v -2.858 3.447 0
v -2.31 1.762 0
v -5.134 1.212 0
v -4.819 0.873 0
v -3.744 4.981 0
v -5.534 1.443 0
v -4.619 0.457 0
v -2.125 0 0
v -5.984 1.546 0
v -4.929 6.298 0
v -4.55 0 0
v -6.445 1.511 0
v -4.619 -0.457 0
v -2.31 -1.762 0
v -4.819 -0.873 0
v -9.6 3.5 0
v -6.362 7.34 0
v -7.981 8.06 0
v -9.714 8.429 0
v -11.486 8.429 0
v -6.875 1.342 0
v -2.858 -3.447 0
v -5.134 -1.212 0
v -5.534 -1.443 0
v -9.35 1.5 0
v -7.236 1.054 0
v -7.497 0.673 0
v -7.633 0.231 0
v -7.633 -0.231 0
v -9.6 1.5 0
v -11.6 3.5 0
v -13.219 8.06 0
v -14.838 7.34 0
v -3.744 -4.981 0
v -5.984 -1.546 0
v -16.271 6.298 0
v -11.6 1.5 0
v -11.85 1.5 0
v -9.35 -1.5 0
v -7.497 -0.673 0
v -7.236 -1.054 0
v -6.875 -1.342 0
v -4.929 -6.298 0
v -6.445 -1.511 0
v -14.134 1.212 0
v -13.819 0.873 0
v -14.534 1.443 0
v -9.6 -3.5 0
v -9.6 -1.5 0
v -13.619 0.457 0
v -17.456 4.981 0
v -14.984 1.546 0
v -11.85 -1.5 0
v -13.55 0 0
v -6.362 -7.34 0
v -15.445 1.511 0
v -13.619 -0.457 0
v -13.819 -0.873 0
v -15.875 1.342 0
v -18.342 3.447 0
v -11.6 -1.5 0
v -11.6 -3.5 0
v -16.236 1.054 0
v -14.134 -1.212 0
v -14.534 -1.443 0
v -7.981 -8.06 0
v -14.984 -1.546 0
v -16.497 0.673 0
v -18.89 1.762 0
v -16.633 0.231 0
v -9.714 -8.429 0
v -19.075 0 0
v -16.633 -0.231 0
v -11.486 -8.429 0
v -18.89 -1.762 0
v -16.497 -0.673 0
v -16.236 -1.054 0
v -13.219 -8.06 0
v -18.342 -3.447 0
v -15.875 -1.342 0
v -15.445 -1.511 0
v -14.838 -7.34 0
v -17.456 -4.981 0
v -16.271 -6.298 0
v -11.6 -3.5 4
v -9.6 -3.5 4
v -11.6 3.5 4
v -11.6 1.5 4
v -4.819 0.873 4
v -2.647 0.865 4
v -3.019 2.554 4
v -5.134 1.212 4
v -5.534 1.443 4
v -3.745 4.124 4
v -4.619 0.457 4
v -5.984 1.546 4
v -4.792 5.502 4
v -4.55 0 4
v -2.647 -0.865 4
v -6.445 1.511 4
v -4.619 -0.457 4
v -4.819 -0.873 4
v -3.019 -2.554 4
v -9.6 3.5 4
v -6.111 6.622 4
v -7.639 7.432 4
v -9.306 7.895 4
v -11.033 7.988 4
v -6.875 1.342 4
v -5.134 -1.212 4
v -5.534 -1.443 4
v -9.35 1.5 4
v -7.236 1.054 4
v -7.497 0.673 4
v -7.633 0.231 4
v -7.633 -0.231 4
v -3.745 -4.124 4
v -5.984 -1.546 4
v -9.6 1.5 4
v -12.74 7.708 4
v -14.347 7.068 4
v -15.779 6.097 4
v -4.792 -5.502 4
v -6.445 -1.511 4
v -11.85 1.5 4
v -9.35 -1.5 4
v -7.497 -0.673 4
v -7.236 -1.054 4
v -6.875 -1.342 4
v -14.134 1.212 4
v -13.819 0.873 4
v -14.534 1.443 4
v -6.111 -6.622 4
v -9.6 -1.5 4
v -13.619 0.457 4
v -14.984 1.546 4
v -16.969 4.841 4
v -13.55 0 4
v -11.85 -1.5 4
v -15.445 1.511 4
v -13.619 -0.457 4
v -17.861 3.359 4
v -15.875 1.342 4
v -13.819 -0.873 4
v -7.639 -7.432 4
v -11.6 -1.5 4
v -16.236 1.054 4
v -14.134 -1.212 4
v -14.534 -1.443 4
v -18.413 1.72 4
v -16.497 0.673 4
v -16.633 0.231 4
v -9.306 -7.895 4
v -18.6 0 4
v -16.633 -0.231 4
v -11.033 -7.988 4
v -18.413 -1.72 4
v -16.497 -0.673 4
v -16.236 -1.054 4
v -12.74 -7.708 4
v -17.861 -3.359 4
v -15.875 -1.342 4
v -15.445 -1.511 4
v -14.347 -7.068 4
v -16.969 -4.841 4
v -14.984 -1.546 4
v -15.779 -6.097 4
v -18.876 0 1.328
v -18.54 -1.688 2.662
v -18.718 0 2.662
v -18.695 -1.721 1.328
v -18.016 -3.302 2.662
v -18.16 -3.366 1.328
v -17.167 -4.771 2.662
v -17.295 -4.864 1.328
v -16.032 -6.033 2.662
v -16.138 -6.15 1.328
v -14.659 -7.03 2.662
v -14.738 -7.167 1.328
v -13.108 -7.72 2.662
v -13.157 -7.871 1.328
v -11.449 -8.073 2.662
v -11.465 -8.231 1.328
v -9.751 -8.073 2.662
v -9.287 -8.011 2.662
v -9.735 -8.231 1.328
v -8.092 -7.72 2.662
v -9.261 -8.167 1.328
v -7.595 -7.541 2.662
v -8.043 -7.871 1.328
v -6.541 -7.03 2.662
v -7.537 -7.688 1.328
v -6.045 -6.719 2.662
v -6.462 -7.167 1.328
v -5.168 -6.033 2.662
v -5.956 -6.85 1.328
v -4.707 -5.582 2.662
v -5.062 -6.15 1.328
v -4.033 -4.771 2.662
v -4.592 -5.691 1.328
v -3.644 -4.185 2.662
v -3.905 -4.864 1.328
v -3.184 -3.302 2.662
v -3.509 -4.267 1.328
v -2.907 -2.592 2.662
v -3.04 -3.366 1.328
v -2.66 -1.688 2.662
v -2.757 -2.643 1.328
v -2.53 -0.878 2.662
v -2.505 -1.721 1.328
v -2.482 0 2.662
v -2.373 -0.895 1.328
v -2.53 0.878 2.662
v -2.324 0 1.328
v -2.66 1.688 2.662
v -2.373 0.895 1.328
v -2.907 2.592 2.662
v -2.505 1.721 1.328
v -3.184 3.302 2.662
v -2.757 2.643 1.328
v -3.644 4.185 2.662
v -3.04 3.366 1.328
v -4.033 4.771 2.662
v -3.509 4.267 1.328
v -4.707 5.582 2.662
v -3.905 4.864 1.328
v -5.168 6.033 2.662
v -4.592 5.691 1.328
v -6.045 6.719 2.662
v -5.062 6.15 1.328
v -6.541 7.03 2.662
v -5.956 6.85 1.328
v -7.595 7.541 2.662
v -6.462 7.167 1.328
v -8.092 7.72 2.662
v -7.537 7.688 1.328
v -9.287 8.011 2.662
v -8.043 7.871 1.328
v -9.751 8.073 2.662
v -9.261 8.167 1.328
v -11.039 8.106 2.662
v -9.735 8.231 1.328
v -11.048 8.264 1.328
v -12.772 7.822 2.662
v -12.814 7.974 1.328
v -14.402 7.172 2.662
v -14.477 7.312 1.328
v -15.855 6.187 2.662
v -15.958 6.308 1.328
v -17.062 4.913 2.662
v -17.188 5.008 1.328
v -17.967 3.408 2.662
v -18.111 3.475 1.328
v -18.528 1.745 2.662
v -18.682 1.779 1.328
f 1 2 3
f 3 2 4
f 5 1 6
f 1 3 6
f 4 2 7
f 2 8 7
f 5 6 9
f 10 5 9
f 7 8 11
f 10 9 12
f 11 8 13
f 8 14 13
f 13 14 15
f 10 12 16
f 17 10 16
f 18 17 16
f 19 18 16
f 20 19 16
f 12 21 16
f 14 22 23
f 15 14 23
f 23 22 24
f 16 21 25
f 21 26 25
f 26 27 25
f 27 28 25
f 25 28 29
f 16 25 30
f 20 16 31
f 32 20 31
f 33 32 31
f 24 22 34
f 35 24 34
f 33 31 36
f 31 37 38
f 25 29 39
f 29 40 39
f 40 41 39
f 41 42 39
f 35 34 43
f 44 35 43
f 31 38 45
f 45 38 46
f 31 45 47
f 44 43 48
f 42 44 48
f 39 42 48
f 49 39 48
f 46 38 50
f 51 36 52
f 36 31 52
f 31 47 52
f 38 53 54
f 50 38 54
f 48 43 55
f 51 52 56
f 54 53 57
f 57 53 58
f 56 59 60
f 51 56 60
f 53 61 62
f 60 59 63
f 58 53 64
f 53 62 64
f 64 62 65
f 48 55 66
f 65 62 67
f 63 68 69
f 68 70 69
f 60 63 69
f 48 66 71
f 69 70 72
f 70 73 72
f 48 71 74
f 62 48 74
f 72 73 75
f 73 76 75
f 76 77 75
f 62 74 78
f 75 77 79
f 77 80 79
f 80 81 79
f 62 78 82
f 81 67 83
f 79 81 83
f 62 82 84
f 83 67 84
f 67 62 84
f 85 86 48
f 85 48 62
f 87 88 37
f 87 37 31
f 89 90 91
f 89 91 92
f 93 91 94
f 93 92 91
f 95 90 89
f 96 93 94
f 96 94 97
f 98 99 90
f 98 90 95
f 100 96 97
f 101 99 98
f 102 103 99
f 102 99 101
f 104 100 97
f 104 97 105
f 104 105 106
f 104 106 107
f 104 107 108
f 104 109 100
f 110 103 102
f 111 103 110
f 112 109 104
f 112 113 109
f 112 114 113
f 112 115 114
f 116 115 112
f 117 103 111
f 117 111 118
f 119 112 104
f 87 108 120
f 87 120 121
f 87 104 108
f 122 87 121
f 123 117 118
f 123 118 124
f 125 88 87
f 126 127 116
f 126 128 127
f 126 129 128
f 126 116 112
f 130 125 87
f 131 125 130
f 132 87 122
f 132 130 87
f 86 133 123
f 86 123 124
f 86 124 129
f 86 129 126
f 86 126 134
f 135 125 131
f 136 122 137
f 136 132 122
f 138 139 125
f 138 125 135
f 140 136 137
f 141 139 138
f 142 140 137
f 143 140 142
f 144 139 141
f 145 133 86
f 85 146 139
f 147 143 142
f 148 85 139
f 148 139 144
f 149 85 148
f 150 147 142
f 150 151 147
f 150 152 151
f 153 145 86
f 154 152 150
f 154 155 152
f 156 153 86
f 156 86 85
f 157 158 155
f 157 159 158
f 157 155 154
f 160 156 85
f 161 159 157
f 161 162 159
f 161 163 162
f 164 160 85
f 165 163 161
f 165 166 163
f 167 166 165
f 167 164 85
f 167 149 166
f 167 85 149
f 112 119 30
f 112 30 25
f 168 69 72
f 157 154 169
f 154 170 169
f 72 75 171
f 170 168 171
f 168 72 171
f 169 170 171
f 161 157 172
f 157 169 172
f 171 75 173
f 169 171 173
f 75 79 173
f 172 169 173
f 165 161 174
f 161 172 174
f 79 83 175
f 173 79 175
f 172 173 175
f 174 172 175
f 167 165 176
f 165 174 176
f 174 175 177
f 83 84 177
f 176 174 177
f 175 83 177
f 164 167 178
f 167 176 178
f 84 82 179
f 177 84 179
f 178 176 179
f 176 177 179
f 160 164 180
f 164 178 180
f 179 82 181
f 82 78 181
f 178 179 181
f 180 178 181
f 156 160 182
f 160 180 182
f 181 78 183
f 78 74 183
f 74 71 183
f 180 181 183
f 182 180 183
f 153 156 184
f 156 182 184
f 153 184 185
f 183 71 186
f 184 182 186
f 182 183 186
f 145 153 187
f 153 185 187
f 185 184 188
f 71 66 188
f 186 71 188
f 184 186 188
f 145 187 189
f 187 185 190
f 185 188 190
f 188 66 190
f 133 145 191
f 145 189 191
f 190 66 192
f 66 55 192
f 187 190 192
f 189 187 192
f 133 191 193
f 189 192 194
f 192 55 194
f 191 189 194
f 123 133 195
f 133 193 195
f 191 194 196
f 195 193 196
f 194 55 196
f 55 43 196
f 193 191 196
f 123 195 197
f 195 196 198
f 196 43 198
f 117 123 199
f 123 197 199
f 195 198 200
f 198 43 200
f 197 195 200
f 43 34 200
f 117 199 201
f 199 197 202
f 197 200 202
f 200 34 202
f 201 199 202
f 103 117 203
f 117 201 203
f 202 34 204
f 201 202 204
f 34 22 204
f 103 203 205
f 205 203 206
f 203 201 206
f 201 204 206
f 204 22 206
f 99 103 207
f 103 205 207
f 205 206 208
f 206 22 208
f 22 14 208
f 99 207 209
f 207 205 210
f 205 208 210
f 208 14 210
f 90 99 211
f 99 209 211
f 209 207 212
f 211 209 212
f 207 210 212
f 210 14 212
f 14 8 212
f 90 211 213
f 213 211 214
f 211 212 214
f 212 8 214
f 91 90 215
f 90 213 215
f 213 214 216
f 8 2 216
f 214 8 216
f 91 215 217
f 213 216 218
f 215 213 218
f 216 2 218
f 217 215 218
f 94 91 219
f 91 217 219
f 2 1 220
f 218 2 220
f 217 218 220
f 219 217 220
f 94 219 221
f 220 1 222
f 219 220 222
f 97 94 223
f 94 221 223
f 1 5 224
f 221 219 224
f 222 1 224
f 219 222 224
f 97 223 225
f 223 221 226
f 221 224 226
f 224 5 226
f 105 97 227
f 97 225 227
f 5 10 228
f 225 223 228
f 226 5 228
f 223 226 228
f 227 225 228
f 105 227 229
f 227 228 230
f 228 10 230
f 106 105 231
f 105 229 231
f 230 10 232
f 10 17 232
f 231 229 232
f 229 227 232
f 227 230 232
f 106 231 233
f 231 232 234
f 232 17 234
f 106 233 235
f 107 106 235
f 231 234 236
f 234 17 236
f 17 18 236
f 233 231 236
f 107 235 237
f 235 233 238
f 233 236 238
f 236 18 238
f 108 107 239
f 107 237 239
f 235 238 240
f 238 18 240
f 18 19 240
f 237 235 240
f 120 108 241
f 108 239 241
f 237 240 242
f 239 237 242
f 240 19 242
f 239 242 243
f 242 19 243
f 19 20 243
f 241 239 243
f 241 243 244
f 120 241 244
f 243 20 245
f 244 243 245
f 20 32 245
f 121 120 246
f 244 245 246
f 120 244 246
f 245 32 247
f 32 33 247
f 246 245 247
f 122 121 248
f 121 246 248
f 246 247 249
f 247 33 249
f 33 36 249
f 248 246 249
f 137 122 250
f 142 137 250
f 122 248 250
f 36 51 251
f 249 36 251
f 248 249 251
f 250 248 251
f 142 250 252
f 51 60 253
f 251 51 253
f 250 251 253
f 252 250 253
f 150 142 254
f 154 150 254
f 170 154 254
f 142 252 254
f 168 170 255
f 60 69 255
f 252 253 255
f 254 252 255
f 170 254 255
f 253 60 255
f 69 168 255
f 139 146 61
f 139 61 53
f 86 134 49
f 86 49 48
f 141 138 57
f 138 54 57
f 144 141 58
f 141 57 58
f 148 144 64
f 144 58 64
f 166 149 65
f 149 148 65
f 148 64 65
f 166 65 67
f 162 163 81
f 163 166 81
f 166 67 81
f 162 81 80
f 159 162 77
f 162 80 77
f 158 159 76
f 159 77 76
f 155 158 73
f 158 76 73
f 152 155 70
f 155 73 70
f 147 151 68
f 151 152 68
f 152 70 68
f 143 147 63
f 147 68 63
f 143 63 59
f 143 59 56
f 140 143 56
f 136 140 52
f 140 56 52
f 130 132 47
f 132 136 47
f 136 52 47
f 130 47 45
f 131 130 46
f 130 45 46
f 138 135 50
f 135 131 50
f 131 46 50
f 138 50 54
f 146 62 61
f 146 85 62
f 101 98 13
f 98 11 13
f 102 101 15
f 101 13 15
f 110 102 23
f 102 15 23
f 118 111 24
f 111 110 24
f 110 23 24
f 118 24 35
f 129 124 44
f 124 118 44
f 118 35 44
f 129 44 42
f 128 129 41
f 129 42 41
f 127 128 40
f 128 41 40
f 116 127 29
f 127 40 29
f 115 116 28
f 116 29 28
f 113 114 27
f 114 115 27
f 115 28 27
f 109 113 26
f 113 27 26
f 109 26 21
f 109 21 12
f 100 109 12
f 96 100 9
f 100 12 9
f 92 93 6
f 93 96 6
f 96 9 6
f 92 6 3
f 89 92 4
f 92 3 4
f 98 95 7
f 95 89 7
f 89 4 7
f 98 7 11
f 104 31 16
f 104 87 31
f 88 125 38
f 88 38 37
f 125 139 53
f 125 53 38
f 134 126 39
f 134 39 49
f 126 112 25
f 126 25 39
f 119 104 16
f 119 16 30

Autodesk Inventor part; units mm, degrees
ref_plane "YZ Plane" through (0, 0, 0) normal (1, 0, 0) x (0, 1, 0)
ref_plane "XZ Plane" through (0, 0, 0) normal (0, 1, 0) x (-1, 0, 0)
ref_plane "XY Plane" through (0, 0, 0) normal (0, 0, 1) x (1, 0, 0)
sketch "Sketch1" plane through (0, 0, 0) normal (0, 0, 1) x (1, 0, 0)
  circle A0 centre (-10.6, 0) radius 8.475
  circle A1 centre (-15.1, 0) radius 2.2 projected
  circle A2 centre (-6.1, 0) radius 2.2 projected
  circle A3 centre (-10.6, 0) radius 8.475
  circle A4 centre (-15.1, 0) radius 2.2
  circle A5 centre (-6.1, 0) radius 2.2
  circle A6 centre (-15.1, 0) radius 1.55
  circle A7 centre (-6.1, 0) radius 1.55
  point P0 (0, 0)
  dimension "d9" = 3.1
  dimension "d10" = 3.1
sketch "Sketch2" plane through (0, 0, 0) normal (0, 1, 0) x (-1, 0, 0)
  line L0 (19.075, 0) -> (2.125, 0) projected
  line L1 (7.55, 0) -> (13.65, 0)
  arc A0 (18.6, 4) -> (19.075, 0) centre (62.4336, 7.177) ccw
  line L2 (13.65, 0) -> (19.075, 0)
  line L3 (10.6, 0) -> (10.6, 4)
  line L4 (10.6, 0) -> (10.6, 4)
  line L5 (10.6, 4) -> (18.6, 4)
  point P0 (0, 0)
  dimension "d15" = 4
  dimension "d16" = 8
revolve "Revolution1" add sketch "Sketch2" angle 360 about axis through (-10.6, 0, 0) along (0, 0, 1)
extrude "Extrusion3" cut sketch "Sketch1" along normal blind 4 contours A6 | A7
sketch "Sketch5" plane through (-10.6, 0, 4) normal (0, 0, 1) x (1, 0, 0)
  line L0 (1, -3.5) -> (-1, -3.5)
  line L1 (-1, -3.5) -> (-1, 3.5)
  line L2 (-1, 3.5) -> (1, 3.5)
  line L3 (1, 3.5) -> (1, -3.5)
  line L4 (1, -3.5) -> (-1, 3.5) construction
  line L5 (-1, -3.5) -> (1, 3.5) construction
  circle A0 centre (-4.5, 0) radius 1.55 projected
  circle A1 centre (4.5, 0) radius 1.55 projected
  circle A2 centre (-4.5, 0) radius 3
  circle A3 centre (4.5, 0) radius 3
  line L6 (1.25, -1.5) -> (-1.25, -1.5)
  line L7 (-1.25, -1.5) -> (-1.25, 1.5)
  line L8 (-1.25, 1.5) -> (1.25, 1.5)
  line L9 (1.25, 1.5) -> (1.25, -1.5)
  line L10 (1.25, -1.5) -> (-1.25, 1.5) construction
  line L11 (-1.25, -1.5) -> (1.25, 1.5) construction
  point P0 (10.6, 0)
  point P1 (0, 0)
  point P2 (1, -1.5)
  point P3 (1, 1.5)
  point P4 (-1, 1.5)
  point P5 (-1, -1.5)
  dimension "d17" = 2
  dimension "d18" = 7
  dimension "d19" = 6
  dimension "d20" = 6
  dimension "d21" = 2.5
  dimension "d22" = 3
extrude "Extrusion5" cut sketch "Sketch5" against normal blind 4 contours L0 L1 L6 L3 | L6 L1 L8 L3 | L3 L8 L9 L6 | L6 L7 L8 L1 | L8 L1 L2 L3
properties part number "Pot_holder"
